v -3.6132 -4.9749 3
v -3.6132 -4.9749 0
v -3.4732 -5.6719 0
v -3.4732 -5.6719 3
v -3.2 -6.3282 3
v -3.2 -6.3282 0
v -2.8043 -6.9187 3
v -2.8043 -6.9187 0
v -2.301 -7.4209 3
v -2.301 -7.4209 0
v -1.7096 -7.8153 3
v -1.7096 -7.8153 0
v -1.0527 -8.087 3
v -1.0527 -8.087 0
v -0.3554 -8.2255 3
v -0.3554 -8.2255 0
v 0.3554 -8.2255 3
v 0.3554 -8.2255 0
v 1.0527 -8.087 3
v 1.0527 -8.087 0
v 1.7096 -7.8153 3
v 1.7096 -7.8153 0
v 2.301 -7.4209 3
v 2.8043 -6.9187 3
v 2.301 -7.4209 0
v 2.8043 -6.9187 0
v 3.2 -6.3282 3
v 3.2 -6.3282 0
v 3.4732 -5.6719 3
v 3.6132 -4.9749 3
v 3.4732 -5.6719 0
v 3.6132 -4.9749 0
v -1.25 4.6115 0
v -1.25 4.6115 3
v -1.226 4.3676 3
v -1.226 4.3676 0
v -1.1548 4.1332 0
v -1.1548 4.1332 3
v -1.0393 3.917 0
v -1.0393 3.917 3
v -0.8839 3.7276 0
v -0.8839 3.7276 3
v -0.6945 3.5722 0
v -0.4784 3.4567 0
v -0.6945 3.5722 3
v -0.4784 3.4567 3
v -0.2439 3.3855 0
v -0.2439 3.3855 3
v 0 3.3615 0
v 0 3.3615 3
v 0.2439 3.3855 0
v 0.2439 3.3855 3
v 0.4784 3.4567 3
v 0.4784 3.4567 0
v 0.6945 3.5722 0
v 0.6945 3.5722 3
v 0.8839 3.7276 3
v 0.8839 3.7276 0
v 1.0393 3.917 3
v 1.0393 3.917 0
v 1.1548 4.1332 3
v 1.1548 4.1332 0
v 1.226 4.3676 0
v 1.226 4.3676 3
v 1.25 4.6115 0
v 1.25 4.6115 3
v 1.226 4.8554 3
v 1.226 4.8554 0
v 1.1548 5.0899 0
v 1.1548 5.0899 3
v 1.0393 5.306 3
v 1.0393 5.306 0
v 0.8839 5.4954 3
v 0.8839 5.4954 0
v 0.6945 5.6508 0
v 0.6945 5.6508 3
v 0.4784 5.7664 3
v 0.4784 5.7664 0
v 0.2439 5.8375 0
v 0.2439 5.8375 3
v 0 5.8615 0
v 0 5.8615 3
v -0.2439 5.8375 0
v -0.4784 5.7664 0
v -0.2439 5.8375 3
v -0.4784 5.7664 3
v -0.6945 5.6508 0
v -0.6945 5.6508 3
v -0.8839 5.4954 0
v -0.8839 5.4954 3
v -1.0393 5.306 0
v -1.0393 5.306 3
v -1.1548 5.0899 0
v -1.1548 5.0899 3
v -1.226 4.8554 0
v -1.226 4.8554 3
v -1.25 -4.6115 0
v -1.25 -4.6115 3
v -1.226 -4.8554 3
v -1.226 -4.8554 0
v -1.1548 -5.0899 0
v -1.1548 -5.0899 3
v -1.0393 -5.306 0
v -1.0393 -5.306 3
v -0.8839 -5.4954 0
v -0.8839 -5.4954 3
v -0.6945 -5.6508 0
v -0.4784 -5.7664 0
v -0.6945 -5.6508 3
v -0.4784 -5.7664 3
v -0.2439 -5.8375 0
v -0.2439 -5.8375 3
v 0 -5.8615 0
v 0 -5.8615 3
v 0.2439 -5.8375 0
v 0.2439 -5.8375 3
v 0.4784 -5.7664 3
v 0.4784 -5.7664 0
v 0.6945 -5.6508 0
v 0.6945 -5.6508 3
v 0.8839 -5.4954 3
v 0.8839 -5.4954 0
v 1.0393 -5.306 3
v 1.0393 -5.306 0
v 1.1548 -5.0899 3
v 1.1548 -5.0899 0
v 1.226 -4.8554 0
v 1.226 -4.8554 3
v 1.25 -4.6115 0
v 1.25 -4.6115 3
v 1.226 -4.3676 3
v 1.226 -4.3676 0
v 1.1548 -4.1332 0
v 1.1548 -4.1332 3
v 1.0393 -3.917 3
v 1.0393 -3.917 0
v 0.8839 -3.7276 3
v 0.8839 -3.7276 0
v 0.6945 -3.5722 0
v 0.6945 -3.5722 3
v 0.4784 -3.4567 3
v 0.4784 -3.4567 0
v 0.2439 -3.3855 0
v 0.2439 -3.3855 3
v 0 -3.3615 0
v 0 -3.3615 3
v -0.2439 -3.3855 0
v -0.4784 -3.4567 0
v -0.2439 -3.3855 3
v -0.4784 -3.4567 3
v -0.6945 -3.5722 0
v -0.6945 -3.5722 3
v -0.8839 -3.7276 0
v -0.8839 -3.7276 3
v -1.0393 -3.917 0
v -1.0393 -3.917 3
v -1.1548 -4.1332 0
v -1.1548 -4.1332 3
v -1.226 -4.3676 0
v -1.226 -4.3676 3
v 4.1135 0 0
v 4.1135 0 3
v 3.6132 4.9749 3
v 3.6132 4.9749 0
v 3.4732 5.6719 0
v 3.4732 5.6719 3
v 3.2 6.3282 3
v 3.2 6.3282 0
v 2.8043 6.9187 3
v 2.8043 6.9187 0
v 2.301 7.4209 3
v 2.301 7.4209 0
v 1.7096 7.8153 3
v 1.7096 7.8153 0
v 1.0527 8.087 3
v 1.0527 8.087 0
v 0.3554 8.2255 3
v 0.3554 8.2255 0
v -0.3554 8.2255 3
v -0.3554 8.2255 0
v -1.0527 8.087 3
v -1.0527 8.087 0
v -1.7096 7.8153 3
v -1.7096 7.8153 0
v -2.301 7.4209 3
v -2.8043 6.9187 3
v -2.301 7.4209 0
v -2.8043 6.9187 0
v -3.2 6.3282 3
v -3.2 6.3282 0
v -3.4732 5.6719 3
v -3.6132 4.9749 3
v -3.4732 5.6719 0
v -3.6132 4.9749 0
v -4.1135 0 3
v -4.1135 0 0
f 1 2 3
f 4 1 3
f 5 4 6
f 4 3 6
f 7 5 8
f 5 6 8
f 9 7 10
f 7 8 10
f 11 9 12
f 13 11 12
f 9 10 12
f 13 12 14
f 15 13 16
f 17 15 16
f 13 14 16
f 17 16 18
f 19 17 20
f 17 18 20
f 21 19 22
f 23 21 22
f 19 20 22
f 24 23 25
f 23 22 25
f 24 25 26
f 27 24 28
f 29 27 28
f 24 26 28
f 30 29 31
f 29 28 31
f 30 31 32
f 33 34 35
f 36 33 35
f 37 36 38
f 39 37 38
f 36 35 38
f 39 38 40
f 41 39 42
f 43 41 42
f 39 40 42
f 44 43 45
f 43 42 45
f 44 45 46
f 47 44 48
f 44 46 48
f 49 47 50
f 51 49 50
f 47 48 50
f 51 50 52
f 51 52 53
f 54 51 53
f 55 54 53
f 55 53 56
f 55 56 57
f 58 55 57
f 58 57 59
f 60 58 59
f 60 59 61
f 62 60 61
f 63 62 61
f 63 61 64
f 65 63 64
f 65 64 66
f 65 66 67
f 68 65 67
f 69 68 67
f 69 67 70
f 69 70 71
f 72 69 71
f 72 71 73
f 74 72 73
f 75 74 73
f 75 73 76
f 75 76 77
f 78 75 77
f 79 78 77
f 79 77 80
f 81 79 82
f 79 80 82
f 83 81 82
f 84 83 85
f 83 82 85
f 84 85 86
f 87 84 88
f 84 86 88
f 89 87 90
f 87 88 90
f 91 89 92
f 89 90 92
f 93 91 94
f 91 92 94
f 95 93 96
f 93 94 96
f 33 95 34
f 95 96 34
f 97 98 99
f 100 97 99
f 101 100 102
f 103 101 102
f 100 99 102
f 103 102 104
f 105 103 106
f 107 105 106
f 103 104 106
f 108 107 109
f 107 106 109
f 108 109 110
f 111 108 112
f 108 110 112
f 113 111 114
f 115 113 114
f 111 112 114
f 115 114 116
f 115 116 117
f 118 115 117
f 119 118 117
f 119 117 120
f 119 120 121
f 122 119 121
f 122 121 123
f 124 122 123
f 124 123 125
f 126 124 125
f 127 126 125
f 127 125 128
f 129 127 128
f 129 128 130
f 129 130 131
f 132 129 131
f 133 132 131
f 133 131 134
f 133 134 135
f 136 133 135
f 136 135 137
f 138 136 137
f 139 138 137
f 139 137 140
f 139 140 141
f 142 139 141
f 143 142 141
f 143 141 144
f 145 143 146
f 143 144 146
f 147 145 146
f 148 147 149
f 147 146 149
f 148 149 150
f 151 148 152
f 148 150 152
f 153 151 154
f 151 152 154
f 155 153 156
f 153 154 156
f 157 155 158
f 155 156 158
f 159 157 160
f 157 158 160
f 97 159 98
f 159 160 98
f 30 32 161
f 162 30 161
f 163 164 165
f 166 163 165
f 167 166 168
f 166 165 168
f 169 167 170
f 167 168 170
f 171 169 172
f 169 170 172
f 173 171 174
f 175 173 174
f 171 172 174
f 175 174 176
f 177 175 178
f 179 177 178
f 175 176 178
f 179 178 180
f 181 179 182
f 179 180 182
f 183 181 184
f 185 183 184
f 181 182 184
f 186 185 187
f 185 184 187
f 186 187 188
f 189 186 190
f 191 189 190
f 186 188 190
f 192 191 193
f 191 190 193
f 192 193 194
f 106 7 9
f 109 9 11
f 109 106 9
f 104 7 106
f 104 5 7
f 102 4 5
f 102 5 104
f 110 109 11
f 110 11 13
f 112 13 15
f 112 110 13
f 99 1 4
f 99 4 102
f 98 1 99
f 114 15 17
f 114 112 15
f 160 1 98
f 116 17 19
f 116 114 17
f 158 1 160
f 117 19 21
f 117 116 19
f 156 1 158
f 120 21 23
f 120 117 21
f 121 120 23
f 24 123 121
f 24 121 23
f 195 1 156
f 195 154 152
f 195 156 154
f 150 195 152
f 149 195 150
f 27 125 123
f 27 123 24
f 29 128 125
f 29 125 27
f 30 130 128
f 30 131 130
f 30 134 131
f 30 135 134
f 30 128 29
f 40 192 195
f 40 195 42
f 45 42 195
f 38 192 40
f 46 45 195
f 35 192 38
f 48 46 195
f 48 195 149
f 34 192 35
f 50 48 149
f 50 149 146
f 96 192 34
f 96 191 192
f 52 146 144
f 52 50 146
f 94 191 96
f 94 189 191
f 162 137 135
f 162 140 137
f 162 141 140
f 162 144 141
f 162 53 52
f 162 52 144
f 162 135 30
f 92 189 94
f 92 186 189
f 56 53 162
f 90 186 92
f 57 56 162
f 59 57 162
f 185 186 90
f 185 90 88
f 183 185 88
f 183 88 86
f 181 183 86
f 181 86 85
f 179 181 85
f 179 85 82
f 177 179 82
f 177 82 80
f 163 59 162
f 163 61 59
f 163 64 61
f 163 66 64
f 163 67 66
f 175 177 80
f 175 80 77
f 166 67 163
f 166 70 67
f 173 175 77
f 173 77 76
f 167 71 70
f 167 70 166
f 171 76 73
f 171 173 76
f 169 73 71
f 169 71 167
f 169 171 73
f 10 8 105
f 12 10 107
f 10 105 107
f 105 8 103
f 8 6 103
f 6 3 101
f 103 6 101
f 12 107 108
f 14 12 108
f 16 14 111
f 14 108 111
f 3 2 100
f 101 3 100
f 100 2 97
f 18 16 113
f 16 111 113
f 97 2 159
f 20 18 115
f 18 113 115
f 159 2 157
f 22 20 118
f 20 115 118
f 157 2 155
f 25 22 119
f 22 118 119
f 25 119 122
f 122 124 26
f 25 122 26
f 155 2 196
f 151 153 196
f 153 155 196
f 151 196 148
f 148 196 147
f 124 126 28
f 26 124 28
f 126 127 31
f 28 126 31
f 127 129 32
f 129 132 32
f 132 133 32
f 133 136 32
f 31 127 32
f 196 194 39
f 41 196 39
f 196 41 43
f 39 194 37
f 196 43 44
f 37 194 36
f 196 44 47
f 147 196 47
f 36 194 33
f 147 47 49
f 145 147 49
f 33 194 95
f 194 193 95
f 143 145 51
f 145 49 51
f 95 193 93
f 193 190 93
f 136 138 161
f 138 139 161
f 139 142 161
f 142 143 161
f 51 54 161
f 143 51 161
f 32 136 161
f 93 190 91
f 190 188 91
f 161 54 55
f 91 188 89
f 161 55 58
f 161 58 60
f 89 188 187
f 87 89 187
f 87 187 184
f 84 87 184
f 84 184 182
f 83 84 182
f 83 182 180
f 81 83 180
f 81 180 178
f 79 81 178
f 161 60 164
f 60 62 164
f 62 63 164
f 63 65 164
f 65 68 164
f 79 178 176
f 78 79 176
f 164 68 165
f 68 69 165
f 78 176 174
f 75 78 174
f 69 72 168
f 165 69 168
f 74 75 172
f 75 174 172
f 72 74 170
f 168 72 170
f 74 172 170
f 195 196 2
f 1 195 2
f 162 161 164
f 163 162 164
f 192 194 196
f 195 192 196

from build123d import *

# Parameters (mm, degrees)
F1_DEPTH = 3
F2_D     = 2.5
F3_D     = 2.5


with BuildPart() as f1:
    # F0 (on Top) → F1 (new body)
    with BuildSketch(Plane.XY):
        with BuildLine():
            Line((-3.613195, 4.974902), (-4.113541, 0))
            Line((-4.113541, 0), (-3.613195, -4.974902))
            ThreePointArc((-3.613195, -4.974902), (0, -8.242932), (3.613195, -4.974902))
            Line((3.613195, -4.974902), (4.113541, 0))
            Line((4.113541, 0), (3.613195, 4.974902))
            ThreePointArc((3.613195, 4.974902), (0, 8.242932), (-3.613195, 4.974902))
        make_face()
    extrude(amount=F1_DEPTH)

    # F2 (through all)
    with Locations(Plane(origin=(0, 0, 0), x_dir=(1, 0, 0), z_dir=(0, 0, -1))):
        with Locations((0, 4.611509)):
            Hole(F2_D / 2)

    # F3 (through all)
    with Locations(Plane(origin=(0, 0, 0), x_dir=(1, 0, 0), z_dir=(0, 0, -1))):
        with Locations((0, -4.611509)):
            Hole(F3_D / 2)


solid = f1.part
